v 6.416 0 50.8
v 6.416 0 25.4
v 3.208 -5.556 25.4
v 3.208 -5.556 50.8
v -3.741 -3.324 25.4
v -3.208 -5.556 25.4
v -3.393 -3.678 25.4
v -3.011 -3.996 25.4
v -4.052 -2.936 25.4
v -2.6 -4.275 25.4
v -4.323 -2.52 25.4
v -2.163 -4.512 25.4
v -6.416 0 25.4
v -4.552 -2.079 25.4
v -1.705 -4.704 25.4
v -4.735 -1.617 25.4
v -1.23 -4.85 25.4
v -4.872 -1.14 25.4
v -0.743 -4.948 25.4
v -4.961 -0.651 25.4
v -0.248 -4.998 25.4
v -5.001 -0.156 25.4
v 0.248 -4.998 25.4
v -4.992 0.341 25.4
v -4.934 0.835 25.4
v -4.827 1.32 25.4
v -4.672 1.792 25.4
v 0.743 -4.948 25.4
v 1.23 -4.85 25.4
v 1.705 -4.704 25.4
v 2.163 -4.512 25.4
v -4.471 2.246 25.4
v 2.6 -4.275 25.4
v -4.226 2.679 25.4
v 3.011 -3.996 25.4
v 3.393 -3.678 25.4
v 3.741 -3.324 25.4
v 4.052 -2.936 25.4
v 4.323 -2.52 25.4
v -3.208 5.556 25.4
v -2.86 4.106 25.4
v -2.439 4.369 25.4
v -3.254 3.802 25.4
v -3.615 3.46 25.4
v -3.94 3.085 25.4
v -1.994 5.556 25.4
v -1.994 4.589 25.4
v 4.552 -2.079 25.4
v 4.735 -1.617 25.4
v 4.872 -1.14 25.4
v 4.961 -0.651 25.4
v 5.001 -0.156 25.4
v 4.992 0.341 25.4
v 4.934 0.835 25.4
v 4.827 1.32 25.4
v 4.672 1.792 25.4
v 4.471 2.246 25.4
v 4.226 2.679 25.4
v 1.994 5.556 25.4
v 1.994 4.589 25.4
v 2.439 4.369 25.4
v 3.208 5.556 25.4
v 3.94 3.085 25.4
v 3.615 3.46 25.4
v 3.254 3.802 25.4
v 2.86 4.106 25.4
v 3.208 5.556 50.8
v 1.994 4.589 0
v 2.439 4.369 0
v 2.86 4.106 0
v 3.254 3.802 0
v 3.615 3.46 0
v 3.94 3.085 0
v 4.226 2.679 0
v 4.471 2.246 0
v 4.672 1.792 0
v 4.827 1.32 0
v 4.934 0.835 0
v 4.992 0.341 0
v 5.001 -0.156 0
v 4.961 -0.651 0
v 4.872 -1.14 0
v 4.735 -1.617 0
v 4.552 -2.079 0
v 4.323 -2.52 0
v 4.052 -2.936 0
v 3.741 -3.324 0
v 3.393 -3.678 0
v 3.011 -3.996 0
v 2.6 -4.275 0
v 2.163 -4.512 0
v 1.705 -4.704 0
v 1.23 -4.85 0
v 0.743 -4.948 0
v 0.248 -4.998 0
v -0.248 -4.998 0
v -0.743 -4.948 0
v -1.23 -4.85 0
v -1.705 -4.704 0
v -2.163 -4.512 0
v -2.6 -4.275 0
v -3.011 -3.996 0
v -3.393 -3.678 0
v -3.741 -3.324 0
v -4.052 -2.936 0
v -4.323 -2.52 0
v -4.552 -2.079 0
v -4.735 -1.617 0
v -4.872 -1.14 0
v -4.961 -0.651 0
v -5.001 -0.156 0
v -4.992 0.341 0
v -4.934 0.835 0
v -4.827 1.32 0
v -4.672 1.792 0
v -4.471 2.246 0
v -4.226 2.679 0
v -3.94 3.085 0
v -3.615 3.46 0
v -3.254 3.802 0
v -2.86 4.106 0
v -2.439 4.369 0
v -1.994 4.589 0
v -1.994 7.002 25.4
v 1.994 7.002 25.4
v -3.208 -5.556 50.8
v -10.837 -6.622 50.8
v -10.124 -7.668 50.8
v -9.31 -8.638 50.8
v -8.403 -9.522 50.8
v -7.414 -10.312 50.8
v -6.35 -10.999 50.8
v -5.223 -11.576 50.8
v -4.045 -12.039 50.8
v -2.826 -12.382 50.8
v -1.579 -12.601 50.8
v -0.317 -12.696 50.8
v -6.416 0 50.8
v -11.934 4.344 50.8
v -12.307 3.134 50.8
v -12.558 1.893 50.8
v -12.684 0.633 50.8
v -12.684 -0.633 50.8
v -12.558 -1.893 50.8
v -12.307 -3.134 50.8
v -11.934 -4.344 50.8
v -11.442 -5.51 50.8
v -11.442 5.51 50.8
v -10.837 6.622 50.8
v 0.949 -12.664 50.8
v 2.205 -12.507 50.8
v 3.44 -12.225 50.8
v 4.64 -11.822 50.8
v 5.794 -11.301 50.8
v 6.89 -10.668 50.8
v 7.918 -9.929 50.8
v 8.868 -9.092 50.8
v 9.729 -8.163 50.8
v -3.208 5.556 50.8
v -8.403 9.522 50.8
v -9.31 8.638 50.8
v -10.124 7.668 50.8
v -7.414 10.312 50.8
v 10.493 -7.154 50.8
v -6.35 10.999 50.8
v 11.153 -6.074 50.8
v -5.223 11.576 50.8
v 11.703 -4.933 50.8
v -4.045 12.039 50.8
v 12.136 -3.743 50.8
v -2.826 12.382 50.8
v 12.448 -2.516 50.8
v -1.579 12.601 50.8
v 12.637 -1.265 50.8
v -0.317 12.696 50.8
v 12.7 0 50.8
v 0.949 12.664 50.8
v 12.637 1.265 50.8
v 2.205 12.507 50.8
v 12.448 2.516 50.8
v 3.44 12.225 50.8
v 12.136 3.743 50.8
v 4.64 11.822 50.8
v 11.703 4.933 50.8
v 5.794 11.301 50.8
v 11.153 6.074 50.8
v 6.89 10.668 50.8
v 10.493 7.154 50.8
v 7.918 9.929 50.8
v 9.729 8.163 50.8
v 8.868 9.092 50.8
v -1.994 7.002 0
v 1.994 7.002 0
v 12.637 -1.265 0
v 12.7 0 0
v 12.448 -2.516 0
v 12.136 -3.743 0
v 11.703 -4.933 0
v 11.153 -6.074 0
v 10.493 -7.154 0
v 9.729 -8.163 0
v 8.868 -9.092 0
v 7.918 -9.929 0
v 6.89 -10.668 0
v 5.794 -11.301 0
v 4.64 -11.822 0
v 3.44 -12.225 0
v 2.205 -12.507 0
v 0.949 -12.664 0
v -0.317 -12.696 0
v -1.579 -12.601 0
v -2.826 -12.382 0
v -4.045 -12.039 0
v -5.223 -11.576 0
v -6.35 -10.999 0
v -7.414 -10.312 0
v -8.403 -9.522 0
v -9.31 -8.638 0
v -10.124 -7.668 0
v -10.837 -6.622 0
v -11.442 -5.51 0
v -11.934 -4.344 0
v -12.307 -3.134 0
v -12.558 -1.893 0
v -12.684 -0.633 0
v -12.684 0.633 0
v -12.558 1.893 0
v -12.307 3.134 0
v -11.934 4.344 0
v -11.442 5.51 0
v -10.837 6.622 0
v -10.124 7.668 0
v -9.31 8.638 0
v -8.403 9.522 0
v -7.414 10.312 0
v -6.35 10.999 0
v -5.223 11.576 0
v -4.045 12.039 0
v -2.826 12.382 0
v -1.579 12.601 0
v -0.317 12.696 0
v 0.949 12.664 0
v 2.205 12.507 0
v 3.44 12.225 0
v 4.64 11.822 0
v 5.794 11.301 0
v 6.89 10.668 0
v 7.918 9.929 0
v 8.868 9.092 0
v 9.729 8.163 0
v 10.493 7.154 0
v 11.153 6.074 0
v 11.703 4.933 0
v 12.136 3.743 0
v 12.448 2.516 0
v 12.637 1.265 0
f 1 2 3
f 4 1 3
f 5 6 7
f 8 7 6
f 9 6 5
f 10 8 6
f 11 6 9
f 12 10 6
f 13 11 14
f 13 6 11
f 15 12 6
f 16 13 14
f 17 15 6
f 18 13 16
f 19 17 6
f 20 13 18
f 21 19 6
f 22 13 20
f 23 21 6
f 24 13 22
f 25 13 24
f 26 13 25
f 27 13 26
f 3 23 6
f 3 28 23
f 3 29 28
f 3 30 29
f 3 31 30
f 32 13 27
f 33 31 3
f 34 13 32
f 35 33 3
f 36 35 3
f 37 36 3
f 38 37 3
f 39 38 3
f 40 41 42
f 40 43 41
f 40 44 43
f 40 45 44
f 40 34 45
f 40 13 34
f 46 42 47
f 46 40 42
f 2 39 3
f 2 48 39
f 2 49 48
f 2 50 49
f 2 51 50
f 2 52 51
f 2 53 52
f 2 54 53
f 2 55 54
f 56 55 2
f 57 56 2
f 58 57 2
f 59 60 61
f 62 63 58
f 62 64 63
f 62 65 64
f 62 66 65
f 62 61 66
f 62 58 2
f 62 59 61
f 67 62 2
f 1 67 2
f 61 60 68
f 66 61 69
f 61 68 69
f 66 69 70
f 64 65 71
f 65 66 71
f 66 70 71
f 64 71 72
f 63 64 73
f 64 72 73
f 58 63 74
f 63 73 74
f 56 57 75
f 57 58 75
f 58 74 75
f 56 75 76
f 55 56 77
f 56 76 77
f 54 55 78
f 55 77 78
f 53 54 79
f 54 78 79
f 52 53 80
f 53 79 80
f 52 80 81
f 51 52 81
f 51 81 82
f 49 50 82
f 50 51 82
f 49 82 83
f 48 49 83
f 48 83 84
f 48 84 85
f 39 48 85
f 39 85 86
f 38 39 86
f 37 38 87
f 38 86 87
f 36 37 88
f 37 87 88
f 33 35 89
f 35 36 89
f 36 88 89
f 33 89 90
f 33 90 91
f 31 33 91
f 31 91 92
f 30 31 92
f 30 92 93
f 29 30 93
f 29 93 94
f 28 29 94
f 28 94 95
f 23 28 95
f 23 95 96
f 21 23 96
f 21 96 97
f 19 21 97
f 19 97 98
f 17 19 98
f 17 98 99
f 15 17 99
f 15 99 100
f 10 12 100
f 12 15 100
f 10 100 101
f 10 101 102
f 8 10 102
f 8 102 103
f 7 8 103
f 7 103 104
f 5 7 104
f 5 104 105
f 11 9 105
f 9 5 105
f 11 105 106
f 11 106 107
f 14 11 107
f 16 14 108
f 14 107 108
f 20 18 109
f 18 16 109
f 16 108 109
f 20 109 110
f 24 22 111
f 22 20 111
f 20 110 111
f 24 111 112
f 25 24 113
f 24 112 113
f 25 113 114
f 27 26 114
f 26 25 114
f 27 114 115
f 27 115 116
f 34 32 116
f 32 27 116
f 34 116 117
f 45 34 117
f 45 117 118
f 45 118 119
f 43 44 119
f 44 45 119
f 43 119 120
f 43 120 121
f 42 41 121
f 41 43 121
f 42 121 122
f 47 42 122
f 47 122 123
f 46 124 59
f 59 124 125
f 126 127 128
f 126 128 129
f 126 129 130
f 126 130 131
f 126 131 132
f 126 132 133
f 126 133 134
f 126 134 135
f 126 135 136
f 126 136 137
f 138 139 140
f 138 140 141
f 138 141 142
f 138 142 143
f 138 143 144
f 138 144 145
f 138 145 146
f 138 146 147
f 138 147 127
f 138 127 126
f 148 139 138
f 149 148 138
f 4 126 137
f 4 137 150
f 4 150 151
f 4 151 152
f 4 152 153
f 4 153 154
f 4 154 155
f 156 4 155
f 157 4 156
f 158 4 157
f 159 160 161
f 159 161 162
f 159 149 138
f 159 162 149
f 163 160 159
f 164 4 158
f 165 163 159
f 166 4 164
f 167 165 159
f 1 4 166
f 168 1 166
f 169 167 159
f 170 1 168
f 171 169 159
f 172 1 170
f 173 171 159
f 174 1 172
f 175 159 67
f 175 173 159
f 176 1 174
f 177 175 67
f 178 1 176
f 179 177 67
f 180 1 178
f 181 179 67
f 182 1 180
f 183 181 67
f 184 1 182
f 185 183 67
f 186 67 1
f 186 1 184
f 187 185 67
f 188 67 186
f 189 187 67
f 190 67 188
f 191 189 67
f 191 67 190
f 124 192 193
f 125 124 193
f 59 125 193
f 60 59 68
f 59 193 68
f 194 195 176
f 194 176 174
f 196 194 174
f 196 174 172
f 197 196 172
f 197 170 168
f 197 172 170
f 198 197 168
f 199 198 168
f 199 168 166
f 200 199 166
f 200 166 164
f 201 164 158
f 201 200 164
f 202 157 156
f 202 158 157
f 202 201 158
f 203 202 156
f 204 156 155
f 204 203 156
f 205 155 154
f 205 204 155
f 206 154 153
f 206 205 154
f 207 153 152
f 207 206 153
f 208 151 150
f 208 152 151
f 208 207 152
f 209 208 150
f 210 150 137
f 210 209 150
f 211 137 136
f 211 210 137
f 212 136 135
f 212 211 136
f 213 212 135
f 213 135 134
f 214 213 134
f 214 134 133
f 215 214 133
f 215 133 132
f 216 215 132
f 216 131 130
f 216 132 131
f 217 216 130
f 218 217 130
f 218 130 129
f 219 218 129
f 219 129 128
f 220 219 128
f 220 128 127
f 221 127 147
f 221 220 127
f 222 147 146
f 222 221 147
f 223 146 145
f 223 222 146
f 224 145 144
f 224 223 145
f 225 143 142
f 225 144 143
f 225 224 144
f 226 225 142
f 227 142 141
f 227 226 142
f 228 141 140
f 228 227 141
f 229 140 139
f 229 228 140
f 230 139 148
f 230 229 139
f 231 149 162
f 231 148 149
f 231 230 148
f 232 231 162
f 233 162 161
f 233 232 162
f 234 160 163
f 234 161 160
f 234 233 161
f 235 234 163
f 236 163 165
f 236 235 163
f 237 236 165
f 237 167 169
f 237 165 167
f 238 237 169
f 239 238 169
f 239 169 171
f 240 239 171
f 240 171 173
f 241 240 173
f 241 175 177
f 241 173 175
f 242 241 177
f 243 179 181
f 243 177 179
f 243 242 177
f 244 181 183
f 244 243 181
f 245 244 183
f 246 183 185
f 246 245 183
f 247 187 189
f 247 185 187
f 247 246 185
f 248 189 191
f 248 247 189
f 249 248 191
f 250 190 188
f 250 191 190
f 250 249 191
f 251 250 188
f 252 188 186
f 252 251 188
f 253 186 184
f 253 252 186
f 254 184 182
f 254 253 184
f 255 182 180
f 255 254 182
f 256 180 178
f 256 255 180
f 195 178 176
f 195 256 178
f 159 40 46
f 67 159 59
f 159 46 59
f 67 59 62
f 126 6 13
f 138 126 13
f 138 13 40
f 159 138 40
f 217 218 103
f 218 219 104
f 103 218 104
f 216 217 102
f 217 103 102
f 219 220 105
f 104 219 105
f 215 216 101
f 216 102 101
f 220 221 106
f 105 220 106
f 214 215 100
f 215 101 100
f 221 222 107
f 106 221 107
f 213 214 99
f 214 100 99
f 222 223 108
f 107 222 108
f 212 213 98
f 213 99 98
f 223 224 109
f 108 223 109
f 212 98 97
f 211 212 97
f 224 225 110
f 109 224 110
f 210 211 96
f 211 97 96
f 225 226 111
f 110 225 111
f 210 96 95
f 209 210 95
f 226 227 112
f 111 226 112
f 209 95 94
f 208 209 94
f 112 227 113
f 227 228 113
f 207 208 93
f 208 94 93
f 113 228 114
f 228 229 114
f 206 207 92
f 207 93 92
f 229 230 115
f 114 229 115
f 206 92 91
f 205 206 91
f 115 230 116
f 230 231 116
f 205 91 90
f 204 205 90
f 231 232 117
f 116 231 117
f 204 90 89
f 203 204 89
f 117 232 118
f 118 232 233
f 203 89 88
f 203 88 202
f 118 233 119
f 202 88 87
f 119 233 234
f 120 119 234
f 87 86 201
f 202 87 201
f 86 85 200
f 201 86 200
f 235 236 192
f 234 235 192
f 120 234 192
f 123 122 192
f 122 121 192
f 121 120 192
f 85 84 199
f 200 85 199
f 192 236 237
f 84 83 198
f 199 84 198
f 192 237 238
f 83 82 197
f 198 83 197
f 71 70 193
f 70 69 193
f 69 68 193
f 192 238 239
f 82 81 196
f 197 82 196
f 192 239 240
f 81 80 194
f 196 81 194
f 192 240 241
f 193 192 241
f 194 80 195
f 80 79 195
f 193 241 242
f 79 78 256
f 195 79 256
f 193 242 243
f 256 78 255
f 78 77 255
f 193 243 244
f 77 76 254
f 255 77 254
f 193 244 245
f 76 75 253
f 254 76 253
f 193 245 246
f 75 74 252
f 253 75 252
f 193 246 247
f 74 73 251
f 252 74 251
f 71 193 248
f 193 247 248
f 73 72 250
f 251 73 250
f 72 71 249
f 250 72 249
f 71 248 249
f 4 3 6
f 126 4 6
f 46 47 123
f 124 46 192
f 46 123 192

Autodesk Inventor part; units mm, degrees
ref_plane "YZ Plane" through (0, 0, 0) normal (1, 0, 0) x (0, 1, 0)
ref_plane "XZ Plane" through (0, 0, 0) normal (0, 1, 0) x (-1, 0, 0)
ref_plane "XY Plane" through (0, 0, 0) normal (0, 0, 1) x (1, 0, 0)
sketch "Sketch1" plane through (0, 0, 0) normal (0, 0, 1) x (1, 0, 0)
  arc A0 (-1.9939, 4.5894) -> (1.9939, 4.5894) centre (0, 0) ccw
  circle A1 centre (0, 0) radius 12.7
  line L0 (-1.9939, 4.5894) -> (-1.9939, 7.0024)
  line L1 (-1.9939, 7.0024) -> (1.9939, 7.0024)
  line L2 (1.9939, 7.0024) -> (1.9939, 4.5894)
  point P0 (0, 5.0038)
  dimension "d0" = 10.0076
  dimension "d1" = 25.4
  dimension "d5" = 2.413
extrude "Extrusion1" add sketch "Sketch1" along normal blind 25.4
sketch "Sketch2" plane through (0, 0, 25.4) normal (0, 0, 1) x (1, 0, 0)
  line L0 (-1.9939, 4.5894) -> (-1.9939, 7.0024) projected
  line L1 (-1.9939, 7.0024) -> (1.9939, 7.0024) projected
  line L2 (1.9939, 7.0024) -> (1.9939, 4.5894) projected
  arc A0 (-1.9939, 4.5894) -> (1.9939, 4.5894) centre (0, 0) ccw projected
  circle A1 centre (0, 0) radius 12.7 projected
  circle A2 centre (0, 0) radius 12.7
  line L3 (6.4158, 0) -> (3.2079, -5.5563)
  line L4 (3.2079, -5.5563) -> (-3.2079, -5.5563)
  line L5 (-3.2079, -5.5563) -> (-6.4158, 0)
  line L6 (-6.4158, 0) -> (-3.2079, 5.5562)
  line L7 (-3.2079, 5.5562) -> (3.2079, 5.5563)
  line L8 (3.2079, 5.5563) -> (6.4158, 0)
  line L9 (-1.9939, 7.0024) -> (1.9939, 7.0024)
  line L10 (1.9939, 7.0024) -> (1.9939, 5.5563)
  line L11 (1.9939, 5.5563) -> (-1.9939, 5.5563)
  line L12 (-1.9939, 5.5563) -> (-1.9939, 7.0024)
  dimension "d8" = 11.1125
extrude "Extrusion2" add sketch "Sketch2" along normal blind 25.4 contours L0 L1 L2 L7 | A1
properties material "ABS Plastic"
